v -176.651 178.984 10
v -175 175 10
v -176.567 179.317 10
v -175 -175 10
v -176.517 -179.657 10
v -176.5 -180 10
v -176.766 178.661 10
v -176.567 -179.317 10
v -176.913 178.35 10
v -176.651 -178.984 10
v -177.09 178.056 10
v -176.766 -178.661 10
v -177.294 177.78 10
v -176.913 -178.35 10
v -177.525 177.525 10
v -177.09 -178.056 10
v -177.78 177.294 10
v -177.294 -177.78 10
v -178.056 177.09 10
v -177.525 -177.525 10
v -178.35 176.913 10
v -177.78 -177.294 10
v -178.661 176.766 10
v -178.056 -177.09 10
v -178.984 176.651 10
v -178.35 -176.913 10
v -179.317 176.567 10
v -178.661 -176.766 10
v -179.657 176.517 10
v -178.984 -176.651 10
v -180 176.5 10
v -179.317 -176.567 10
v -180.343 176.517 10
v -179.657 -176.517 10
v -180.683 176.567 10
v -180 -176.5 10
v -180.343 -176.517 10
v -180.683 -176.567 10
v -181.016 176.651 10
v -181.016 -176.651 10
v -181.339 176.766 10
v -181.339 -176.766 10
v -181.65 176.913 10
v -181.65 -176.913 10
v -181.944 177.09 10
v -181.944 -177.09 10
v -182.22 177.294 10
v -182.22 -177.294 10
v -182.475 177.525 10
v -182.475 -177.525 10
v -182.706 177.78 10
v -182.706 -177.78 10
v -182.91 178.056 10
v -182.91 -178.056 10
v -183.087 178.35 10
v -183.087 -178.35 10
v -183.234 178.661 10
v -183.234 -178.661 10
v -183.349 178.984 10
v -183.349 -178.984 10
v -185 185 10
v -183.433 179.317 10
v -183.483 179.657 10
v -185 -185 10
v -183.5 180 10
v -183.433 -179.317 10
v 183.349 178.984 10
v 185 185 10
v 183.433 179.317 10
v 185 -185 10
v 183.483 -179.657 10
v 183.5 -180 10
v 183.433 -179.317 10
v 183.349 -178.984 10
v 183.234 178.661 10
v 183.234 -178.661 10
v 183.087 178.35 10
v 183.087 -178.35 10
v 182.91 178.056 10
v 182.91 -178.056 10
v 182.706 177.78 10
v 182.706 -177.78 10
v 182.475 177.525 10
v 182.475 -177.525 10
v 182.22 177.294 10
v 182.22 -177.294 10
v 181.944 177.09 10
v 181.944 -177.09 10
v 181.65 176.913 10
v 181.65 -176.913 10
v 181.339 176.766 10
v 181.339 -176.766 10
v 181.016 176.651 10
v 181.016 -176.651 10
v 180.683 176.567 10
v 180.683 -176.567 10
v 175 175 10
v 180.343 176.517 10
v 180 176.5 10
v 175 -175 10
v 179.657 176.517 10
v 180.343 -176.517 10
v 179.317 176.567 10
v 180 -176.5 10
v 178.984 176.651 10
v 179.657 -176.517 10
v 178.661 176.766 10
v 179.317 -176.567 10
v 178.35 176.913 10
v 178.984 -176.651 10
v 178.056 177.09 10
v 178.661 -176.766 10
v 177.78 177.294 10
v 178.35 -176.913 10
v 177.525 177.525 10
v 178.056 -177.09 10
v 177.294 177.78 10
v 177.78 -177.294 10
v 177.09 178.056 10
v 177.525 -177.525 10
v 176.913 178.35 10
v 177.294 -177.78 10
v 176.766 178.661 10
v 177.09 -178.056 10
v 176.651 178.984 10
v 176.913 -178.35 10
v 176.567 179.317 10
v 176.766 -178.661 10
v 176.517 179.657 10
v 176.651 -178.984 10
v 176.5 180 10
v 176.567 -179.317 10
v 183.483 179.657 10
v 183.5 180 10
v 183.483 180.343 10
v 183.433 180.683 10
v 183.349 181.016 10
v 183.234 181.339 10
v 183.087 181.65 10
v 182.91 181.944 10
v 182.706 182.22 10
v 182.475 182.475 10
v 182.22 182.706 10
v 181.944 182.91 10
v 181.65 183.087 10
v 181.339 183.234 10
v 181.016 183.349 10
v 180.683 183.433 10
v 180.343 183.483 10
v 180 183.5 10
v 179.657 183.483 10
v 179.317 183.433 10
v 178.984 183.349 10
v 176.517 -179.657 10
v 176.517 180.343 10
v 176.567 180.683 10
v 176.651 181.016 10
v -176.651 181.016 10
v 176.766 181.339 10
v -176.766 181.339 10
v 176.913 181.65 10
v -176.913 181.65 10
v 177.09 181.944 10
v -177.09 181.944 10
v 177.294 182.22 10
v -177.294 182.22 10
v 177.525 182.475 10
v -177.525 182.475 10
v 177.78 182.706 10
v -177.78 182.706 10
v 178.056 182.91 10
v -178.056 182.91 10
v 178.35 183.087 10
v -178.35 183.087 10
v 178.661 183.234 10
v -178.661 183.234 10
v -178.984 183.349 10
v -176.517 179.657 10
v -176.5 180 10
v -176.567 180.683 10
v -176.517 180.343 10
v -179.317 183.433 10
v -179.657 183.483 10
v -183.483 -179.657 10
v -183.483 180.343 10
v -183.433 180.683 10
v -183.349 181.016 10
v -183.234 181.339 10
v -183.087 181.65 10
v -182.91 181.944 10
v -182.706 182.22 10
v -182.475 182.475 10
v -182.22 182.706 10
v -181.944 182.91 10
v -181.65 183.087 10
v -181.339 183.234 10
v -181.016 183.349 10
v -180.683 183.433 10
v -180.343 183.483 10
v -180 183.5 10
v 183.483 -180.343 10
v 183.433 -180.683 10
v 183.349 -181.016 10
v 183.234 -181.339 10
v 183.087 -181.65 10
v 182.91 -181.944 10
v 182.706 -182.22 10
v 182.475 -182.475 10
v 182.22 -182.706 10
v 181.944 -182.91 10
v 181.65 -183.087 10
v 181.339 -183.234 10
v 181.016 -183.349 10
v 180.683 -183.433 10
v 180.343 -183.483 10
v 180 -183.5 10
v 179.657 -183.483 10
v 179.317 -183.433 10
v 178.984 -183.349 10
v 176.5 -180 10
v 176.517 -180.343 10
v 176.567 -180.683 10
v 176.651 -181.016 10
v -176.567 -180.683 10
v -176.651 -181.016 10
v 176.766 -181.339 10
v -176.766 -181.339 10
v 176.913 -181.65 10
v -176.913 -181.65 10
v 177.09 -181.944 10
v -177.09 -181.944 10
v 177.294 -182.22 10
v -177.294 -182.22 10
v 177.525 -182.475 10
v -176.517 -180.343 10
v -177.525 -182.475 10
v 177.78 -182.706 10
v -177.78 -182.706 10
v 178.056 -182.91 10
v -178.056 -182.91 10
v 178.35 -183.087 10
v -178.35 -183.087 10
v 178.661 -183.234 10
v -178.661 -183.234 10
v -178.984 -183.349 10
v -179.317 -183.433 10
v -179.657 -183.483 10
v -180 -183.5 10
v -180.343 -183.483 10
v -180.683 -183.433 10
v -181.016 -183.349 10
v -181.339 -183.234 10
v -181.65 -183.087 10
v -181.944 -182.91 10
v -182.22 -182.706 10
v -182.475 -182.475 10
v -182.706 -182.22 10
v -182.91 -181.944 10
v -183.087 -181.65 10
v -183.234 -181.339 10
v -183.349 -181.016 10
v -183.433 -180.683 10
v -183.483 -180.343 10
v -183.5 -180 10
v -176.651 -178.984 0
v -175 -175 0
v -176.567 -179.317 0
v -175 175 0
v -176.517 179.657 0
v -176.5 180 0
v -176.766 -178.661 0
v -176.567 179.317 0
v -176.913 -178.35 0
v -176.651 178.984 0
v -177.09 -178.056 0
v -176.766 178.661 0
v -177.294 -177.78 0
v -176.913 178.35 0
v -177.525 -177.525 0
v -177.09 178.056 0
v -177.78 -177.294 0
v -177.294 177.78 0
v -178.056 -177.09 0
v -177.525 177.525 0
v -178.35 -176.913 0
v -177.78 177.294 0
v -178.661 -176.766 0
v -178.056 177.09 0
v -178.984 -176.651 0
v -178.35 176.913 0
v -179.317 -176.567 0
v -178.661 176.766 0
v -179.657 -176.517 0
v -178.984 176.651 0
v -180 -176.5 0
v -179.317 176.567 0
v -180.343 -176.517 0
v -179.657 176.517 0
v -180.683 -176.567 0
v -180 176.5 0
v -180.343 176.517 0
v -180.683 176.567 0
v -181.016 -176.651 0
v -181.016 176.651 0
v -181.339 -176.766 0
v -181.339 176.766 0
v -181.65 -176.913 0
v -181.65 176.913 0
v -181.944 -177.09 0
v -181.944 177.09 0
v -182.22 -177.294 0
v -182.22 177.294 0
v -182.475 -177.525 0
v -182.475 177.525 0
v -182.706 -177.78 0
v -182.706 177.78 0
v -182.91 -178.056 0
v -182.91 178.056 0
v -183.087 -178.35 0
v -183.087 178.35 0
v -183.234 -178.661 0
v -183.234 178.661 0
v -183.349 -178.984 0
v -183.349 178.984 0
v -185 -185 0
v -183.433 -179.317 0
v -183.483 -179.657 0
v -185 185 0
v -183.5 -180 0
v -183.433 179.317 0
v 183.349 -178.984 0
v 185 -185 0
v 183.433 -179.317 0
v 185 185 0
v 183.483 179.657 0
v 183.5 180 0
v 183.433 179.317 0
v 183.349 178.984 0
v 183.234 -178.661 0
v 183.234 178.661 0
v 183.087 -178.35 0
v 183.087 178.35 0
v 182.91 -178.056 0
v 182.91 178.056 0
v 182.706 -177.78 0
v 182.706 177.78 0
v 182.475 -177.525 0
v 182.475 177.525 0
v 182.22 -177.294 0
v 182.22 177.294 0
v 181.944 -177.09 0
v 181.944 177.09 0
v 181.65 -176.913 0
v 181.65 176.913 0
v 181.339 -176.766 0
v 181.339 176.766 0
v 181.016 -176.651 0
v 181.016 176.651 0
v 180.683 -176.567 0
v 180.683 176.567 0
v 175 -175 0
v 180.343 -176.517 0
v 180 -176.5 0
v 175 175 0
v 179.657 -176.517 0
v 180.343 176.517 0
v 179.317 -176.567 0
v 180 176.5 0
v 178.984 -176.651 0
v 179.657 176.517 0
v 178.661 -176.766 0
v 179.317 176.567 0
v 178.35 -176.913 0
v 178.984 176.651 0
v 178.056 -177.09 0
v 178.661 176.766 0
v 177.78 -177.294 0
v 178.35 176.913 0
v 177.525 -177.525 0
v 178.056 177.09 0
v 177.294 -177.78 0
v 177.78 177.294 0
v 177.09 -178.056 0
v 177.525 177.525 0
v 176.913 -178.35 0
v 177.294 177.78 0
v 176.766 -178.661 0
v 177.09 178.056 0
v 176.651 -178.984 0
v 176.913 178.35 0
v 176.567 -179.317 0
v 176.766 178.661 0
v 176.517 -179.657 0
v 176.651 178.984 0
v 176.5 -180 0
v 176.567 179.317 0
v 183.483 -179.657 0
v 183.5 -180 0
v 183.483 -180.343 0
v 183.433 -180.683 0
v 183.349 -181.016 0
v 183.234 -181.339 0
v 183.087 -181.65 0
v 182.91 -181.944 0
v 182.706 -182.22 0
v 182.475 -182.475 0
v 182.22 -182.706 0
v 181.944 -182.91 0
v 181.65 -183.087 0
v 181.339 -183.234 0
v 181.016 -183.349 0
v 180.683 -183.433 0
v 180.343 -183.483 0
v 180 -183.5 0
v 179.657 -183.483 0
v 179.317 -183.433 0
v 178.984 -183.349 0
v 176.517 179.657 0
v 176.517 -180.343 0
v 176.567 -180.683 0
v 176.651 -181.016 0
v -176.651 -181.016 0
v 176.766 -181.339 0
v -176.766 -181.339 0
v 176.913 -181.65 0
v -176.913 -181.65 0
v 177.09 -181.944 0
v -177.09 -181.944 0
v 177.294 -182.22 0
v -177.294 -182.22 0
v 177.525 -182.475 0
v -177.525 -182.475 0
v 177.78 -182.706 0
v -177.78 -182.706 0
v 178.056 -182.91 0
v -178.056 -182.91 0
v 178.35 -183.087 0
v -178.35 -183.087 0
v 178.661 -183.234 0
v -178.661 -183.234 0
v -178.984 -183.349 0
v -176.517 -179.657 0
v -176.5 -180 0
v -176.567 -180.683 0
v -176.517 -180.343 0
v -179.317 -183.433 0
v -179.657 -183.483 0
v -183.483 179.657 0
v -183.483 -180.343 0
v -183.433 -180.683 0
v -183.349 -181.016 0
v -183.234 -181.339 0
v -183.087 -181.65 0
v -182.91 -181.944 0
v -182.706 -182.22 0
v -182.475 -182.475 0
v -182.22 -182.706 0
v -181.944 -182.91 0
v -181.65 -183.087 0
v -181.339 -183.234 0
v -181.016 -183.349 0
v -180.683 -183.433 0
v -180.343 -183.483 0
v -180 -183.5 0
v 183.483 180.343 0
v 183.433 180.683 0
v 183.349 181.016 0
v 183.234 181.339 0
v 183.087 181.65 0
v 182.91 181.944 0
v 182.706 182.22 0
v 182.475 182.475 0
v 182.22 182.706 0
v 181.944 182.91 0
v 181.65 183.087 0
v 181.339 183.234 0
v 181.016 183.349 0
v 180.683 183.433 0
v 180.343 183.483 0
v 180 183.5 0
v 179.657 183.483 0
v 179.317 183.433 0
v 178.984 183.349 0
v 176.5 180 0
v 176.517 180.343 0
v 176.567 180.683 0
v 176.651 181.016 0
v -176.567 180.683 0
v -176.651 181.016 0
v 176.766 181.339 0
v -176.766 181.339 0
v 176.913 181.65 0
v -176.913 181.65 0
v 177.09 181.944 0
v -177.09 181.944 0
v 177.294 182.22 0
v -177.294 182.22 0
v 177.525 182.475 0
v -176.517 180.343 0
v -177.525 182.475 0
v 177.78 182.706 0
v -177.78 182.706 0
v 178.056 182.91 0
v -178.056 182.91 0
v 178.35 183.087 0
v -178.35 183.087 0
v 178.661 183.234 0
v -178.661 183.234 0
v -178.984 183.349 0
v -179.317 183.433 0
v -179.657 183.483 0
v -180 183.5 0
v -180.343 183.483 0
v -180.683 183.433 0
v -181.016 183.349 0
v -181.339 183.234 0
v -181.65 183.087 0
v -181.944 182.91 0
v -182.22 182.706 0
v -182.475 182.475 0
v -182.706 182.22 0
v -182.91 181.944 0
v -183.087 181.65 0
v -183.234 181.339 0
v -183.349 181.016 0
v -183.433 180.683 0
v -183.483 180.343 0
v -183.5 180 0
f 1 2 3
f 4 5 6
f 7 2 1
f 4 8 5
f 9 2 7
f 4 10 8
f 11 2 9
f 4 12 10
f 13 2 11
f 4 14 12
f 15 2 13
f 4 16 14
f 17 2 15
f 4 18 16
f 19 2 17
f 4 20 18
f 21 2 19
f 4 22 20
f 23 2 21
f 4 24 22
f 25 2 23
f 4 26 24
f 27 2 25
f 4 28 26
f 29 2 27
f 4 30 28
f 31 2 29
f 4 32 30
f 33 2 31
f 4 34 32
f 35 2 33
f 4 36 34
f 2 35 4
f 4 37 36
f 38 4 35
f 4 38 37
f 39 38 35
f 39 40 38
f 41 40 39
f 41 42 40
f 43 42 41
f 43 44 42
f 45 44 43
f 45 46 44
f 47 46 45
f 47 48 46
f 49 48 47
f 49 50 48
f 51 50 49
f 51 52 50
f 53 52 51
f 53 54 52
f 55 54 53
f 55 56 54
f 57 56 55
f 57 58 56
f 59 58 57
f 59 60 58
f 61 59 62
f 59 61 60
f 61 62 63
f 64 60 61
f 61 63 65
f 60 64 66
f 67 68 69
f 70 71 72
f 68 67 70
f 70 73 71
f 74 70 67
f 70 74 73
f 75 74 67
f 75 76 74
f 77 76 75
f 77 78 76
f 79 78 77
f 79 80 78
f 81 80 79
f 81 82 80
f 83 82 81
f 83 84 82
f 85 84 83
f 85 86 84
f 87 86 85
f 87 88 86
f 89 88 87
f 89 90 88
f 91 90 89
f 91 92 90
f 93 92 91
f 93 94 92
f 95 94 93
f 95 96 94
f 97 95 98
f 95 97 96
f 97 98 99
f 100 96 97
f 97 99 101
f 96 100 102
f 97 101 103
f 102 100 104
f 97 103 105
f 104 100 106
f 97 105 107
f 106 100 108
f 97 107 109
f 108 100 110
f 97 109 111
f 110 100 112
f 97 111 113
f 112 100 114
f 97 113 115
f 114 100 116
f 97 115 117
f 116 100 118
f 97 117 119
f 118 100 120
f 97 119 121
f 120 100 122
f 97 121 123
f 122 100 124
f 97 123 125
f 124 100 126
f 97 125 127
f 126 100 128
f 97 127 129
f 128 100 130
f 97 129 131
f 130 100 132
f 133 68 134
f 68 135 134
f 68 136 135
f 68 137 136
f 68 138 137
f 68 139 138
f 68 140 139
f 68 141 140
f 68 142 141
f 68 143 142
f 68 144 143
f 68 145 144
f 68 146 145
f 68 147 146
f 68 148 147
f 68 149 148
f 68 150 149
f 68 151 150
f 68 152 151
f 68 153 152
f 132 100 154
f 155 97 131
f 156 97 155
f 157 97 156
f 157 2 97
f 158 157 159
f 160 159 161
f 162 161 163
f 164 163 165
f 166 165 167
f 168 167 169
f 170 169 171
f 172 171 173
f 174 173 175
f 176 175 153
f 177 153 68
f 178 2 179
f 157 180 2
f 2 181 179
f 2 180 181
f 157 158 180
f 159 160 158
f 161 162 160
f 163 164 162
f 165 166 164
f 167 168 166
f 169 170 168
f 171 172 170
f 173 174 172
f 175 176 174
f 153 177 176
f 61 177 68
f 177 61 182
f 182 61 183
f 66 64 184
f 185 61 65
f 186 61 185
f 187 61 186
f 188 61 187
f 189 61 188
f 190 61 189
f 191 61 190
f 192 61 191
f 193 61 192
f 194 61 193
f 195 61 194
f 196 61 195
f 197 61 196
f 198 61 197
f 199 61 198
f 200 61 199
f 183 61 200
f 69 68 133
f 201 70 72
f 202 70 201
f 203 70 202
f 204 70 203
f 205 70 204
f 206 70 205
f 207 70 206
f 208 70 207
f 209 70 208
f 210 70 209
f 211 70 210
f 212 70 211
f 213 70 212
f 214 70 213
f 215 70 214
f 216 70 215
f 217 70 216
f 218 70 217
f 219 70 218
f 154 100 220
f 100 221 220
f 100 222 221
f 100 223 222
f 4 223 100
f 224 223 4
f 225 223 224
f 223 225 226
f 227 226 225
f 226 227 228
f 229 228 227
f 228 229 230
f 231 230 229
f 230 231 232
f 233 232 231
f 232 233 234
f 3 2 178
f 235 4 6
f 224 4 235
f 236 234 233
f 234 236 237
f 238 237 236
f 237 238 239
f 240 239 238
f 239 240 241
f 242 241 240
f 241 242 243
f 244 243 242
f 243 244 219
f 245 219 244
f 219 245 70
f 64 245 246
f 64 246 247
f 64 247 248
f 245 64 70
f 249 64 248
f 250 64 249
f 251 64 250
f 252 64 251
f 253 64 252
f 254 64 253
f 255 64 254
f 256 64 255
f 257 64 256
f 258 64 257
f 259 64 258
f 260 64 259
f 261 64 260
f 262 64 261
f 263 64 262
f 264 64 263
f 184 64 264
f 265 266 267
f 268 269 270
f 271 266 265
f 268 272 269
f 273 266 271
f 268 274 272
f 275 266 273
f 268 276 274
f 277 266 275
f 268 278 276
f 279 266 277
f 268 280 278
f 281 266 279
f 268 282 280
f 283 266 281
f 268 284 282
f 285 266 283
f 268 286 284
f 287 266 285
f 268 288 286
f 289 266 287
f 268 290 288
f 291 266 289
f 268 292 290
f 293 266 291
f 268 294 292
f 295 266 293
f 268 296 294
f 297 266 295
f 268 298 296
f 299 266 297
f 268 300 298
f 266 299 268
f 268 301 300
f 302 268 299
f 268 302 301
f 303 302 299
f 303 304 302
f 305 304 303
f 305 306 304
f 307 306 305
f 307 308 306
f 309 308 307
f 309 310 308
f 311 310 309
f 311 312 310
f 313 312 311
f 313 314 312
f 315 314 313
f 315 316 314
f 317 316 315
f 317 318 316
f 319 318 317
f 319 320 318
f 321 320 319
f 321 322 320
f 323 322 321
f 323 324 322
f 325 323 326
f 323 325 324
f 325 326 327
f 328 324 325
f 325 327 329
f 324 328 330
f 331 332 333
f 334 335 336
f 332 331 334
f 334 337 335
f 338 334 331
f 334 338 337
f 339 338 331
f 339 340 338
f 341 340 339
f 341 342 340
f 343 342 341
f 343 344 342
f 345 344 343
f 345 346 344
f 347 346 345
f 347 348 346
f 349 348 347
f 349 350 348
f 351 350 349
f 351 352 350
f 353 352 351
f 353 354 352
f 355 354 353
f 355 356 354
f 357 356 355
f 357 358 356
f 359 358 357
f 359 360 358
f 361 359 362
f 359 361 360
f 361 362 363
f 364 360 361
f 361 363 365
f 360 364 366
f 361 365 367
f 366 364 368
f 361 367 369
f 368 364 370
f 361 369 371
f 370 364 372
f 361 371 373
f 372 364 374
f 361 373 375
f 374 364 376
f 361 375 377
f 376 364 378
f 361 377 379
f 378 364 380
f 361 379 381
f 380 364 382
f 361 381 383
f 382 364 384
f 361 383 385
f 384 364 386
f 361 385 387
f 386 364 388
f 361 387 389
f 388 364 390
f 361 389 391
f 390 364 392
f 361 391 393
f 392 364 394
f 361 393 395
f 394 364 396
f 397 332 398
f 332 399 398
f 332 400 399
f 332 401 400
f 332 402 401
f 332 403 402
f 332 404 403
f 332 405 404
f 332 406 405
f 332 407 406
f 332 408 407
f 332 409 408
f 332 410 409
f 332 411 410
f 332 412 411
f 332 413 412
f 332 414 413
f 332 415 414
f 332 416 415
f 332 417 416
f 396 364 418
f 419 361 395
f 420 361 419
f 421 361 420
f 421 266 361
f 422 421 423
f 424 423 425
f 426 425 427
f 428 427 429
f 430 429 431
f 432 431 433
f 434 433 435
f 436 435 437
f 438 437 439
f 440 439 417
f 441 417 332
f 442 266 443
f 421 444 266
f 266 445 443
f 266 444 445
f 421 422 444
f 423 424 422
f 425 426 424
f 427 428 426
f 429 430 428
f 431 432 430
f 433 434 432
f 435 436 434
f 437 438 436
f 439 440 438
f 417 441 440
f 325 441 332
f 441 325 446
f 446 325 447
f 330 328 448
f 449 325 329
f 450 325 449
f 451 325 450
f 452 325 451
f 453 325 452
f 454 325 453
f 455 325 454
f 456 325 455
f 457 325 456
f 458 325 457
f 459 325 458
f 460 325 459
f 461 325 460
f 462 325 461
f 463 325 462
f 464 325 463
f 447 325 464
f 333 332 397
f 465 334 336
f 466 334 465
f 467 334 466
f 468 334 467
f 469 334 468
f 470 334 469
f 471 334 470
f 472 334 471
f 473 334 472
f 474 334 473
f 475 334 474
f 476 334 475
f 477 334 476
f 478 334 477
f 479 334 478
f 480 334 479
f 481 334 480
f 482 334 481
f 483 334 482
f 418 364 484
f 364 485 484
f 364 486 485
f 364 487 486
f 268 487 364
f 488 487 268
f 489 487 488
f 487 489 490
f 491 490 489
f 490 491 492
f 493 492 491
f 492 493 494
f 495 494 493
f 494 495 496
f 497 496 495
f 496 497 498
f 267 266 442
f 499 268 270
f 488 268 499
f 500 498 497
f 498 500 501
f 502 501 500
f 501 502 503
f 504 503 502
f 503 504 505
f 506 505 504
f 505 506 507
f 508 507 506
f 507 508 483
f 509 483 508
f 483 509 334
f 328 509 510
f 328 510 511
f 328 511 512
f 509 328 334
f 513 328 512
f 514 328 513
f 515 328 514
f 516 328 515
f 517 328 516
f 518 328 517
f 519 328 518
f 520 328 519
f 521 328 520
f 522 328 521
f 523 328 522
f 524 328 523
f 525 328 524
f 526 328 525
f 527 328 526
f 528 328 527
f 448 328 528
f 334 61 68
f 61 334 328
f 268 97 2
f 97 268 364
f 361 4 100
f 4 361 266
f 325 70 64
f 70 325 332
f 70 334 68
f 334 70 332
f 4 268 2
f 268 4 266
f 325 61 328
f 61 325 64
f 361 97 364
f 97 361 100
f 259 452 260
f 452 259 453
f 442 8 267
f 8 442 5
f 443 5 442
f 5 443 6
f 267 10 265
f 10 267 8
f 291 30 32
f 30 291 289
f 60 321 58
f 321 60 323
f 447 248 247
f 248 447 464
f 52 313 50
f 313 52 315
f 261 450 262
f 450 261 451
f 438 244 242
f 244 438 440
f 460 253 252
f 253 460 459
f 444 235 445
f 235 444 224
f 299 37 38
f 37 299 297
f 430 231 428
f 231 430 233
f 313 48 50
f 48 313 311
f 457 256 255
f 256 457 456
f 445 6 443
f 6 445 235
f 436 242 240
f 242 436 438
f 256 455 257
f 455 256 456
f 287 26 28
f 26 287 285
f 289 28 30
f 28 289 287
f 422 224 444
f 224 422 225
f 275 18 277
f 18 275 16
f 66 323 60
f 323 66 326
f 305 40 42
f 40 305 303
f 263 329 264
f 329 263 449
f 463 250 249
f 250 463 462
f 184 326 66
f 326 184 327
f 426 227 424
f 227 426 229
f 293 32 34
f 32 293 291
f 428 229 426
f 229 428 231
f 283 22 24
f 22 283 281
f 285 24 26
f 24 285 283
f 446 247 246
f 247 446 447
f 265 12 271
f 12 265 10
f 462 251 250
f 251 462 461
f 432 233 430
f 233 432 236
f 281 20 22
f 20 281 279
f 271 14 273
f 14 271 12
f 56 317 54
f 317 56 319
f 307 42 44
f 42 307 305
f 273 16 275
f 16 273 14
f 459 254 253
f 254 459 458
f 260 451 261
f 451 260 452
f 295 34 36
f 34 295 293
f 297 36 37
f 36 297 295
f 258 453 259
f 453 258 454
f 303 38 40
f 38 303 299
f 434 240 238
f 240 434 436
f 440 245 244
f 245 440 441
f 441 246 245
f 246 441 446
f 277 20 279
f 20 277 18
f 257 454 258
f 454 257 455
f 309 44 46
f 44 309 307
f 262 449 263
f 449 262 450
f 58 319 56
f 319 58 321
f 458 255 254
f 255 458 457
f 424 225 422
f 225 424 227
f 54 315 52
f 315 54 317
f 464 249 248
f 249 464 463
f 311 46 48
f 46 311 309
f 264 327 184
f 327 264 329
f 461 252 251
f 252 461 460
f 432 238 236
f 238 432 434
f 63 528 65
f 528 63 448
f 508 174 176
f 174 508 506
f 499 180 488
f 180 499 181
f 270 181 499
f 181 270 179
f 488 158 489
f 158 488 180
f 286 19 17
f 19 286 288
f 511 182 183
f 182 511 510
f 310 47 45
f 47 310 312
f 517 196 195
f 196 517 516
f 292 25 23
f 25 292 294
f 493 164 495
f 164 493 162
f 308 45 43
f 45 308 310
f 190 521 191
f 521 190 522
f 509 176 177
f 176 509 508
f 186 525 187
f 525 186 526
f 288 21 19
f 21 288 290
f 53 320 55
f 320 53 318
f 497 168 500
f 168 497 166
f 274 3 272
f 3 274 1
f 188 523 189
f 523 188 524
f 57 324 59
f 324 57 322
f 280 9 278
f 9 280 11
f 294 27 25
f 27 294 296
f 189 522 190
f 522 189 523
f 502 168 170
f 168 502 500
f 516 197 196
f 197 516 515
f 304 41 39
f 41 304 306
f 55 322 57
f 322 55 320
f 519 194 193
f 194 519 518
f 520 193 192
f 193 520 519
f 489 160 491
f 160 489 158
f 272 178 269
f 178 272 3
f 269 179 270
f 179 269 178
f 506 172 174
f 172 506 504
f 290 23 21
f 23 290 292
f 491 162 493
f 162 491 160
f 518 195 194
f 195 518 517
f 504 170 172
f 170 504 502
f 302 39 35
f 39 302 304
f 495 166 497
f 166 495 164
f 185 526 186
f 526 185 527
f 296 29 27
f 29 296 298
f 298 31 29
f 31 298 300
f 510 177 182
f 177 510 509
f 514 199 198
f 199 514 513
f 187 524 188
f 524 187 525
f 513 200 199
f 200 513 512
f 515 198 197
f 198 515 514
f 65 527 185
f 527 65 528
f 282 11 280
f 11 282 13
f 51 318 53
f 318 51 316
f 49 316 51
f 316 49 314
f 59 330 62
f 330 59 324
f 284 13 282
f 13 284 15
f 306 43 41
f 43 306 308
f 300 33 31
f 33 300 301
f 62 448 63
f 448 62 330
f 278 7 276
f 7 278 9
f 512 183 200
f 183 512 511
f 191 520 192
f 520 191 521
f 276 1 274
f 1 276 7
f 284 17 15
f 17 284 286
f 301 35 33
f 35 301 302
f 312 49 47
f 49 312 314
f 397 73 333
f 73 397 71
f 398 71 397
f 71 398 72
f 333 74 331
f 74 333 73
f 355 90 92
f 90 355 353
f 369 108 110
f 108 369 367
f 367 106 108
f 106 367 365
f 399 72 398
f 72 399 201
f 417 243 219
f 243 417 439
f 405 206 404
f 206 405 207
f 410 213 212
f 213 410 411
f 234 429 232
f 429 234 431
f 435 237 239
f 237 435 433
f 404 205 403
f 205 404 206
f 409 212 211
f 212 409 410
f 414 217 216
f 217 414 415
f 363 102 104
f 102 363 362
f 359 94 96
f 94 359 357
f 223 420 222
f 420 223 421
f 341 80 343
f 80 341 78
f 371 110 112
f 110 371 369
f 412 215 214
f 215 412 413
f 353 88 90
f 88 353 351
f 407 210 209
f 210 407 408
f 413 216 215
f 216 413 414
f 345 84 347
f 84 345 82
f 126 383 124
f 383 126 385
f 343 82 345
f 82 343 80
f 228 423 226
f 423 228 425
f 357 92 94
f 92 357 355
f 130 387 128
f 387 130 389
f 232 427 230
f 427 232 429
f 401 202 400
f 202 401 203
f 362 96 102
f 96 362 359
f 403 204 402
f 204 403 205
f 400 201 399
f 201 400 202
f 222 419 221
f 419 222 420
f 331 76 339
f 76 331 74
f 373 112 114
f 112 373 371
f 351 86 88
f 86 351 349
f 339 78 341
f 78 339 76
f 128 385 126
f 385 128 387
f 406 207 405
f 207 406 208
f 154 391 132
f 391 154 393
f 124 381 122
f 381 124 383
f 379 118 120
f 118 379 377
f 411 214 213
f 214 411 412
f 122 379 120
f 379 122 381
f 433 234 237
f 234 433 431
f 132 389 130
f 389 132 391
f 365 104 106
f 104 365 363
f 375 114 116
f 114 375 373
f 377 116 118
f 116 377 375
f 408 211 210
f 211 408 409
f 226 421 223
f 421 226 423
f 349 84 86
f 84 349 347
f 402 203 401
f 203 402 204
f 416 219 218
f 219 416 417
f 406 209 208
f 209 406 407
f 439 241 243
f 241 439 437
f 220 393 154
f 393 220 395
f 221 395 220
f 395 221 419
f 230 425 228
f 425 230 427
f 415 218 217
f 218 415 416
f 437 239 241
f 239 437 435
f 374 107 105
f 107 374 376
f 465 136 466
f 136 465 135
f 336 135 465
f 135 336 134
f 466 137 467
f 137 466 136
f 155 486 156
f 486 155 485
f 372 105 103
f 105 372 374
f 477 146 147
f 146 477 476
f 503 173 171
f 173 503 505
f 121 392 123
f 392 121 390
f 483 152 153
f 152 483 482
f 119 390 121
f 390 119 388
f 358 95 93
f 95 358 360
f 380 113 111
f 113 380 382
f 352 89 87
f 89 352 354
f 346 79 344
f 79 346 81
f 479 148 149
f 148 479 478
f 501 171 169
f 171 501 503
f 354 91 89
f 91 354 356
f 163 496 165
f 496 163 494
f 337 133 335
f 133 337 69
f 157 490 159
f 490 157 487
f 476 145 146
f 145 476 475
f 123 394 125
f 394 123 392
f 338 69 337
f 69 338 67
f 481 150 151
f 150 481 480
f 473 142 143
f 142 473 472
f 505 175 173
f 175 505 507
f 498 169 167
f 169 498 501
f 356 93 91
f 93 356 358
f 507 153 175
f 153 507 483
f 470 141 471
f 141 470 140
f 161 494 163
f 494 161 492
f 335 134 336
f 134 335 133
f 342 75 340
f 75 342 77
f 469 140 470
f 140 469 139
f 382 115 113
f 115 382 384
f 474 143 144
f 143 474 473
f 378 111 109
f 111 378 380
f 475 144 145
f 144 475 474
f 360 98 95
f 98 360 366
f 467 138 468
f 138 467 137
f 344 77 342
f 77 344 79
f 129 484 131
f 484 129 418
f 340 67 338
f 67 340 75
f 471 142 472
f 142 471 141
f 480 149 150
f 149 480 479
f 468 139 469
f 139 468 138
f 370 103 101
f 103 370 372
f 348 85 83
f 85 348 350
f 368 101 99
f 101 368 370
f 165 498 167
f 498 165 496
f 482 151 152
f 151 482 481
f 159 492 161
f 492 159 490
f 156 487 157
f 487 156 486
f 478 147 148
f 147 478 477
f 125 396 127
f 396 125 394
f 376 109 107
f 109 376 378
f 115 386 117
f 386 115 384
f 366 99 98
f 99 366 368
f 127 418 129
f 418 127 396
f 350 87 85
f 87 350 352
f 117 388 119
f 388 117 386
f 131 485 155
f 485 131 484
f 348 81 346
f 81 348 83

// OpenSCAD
// ring_29.scad - ring index 29 (z bottom = 290 mm)
$fn = 64; bar = 10; half_b = bar/2; outer = 370; half_outer = outer/2;
front_y = 180; back_y = -180; left_x = -180; right_x = 180;
x_centers = [-170, -100, -30, 40, 110, 180];
z_centers = [5, 85, 155, 225, 295, 365, 435, 505, 575, 645, 715]; ring_z = 290;
module place_box(cx, cy, sx, sy) { translate([cx - sx/2, cy - sy/2, 0]) cube([sx, sy, bar]); }

difference() { union() {
    for (x = x_centers) { place_box(x, front_y, bar, bar); place_box(x, back_y, bar, bar); }
    for (y = x_centers) { place_box(left_x, y, bar, bar); place_box(right_x, y, bar, bar); }
    for (zc = z_centers) if ((zc - half_b < ring_z + bar) && (zc + half_b > ring_z)) {
        translate([-half_outer, front_y - half_b, 0]) cube([outer, bar, bar]);
        translate([-half_outer, back_y - half_b, 0])  cube([outer, bar, bar]);
        translate([left_x - half_b, -half_outer, 0])  cube([bar, outer, bar]);
        translate([right_x - half_b, -half_outer, 0]) cube([bar, outer, bar]);
    }
  }
  for (cx = [-180, 180]) for (cy = [-180, 180]) translate([cx, cy, 0]) cylinder(h = bar, r = 3.5, $fn = 64);
}
